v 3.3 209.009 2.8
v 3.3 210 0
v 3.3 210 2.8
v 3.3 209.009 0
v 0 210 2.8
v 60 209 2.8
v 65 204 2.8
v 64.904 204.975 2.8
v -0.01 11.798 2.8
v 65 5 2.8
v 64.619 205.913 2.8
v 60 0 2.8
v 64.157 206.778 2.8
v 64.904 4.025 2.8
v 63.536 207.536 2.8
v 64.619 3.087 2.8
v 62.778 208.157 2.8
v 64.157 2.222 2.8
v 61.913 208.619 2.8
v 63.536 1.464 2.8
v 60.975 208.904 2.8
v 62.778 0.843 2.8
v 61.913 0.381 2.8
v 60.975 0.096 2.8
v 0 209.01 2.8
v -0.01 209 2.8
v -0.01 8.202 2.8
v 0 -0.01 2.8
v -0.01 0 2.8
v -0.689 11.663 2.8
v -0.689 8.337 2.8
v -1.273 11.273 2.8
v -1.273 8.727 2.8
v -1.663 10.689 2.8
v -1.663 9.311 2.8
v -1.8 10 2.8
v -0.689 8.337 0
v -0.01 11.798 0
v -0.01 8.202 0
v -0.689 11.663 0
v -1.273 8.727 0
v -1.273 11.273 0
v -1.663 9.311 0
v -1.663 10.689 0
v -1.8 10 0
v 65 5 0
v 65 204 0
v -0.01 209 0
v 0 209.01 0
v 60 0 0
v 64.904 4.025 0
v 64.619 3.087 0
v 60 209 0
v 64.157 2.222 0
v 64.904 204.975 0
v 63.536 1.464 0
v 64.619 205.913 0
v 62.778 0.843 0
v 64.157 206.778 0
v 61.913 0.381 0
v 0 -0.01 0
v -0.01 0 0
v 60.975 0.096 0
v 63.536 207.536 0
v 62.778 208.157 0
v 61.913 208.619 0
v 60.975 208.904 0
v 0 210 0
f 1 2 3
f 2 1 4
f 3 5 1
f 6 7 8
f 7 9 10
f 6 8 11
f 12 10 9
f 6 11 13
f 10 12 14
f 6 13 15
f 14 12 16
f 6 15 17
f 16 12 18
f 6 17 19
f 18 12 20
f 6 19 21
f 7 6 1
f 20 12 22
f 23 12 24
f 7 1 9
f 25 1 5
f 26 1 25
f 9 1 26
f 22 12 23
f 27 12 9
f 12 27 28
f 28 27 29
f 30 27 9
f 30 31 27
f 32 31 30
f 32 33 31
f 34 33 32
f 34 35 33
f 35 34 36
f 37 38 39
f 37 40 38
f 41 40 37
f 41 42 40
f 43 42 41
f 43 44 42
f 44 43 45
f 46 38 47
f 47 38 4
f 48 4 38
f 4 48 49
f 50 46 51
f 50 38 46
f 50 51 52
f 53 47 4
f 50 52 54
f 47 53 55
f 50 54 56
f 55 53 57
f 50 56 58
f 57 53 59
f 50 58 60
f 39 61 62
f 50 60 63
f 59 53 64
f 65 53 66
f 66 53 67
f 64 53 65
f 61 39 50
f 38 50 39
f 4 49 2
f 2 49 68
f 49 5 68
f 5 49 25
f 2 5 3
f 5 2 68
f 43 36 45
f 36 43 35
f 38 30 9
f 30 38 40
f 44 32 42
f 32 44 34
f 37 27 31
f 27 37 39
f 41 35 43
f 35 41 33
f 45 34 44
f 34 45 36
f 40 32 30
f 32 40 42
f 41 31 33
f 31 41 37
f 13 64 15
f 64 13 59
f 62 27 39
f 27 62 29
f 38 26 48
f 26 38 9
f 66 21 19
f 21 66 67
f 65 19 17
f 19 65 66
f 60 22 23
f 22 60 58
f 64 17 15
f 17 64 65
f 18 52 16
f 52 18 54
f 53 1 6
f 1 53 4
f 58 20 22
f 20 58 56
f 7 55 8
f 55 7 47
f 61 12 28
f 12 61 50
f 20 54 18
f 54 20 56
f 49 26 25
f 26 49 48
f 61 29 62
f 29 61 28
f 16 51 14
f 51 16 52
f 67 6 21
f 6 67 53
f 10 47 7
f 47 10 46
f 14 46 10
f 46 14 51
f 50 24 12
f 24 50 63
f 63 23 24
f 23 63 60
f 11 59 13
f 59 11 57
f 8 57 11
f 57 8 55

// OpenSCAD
// B部分：65mm × 209mm × 2.8mm
// 滑槽式拼接 - 滑舌
// 从上往下滑入A部分

// 参数
width = 65;      // 宽度 (mm)
height = 209;    // 高度 (mm)
thickness = 2.8; // 厚度 (mm)
corner_radius = 5;  // 倒角半径 (mm)

// 滑槽参数（与A部分匹配）
slot_depth = 3.3;     // 滑舌长度 (mm，比槽长0.3mm)
slot_height = 2.8;    // 滑舌高度 (mm，等于厚度）
slot_length = 200;    // 滑舌长度 (mm)
slot_offset = 10;      // 滑舌距离边缘 (mm)
tolerance = 0.3;       // 配合公差

// 定位销参数
pin_radius = 1.5;
pin_height = 2.8;

// 圆角矩形模块（左侧不倒角）
module rounded_rect_left_flat(w, h, r, t) {
    hull() {
        translate([0, 0, 0]) cylinder(h = t, r = 0.01, $fn = 4);
        translate([0, h, 0]) cylinder(h = t, r = 0.01, $fn = 4);
        translate([w - r, h - r, 0]) cylinder(h = t, r = r, $fn = 32);
        translate([w - r, r, 0]) cylinder(h = t, r = r, $fn = 32);
    }
}

// 创建主体
difference() {
    union() {
        // 面板主体
        color("LightGray") {
            rounded_rect_left_flat(width, height, corner_radius, thickness);
        }

        // 滑舌（在左侧，从上往下滑入）
        color("Blue") {
            translate([0, slot_offset, 0])
            cube([slot_depth, slot_length, slot_height]);

            // 顶部定位销（防止滑出）
            translate([0, slot_offset, 0])
            cylinder(h = pin_height, r = pin_radius + tolerance, $fn = 16);
        }
    }
}

// 装配预览（打印时可注释掉）
/*
color("LightGray", 0.3)
translate([-slot_depth, 0, 0])
import("part_A_slider.stl");
*/
